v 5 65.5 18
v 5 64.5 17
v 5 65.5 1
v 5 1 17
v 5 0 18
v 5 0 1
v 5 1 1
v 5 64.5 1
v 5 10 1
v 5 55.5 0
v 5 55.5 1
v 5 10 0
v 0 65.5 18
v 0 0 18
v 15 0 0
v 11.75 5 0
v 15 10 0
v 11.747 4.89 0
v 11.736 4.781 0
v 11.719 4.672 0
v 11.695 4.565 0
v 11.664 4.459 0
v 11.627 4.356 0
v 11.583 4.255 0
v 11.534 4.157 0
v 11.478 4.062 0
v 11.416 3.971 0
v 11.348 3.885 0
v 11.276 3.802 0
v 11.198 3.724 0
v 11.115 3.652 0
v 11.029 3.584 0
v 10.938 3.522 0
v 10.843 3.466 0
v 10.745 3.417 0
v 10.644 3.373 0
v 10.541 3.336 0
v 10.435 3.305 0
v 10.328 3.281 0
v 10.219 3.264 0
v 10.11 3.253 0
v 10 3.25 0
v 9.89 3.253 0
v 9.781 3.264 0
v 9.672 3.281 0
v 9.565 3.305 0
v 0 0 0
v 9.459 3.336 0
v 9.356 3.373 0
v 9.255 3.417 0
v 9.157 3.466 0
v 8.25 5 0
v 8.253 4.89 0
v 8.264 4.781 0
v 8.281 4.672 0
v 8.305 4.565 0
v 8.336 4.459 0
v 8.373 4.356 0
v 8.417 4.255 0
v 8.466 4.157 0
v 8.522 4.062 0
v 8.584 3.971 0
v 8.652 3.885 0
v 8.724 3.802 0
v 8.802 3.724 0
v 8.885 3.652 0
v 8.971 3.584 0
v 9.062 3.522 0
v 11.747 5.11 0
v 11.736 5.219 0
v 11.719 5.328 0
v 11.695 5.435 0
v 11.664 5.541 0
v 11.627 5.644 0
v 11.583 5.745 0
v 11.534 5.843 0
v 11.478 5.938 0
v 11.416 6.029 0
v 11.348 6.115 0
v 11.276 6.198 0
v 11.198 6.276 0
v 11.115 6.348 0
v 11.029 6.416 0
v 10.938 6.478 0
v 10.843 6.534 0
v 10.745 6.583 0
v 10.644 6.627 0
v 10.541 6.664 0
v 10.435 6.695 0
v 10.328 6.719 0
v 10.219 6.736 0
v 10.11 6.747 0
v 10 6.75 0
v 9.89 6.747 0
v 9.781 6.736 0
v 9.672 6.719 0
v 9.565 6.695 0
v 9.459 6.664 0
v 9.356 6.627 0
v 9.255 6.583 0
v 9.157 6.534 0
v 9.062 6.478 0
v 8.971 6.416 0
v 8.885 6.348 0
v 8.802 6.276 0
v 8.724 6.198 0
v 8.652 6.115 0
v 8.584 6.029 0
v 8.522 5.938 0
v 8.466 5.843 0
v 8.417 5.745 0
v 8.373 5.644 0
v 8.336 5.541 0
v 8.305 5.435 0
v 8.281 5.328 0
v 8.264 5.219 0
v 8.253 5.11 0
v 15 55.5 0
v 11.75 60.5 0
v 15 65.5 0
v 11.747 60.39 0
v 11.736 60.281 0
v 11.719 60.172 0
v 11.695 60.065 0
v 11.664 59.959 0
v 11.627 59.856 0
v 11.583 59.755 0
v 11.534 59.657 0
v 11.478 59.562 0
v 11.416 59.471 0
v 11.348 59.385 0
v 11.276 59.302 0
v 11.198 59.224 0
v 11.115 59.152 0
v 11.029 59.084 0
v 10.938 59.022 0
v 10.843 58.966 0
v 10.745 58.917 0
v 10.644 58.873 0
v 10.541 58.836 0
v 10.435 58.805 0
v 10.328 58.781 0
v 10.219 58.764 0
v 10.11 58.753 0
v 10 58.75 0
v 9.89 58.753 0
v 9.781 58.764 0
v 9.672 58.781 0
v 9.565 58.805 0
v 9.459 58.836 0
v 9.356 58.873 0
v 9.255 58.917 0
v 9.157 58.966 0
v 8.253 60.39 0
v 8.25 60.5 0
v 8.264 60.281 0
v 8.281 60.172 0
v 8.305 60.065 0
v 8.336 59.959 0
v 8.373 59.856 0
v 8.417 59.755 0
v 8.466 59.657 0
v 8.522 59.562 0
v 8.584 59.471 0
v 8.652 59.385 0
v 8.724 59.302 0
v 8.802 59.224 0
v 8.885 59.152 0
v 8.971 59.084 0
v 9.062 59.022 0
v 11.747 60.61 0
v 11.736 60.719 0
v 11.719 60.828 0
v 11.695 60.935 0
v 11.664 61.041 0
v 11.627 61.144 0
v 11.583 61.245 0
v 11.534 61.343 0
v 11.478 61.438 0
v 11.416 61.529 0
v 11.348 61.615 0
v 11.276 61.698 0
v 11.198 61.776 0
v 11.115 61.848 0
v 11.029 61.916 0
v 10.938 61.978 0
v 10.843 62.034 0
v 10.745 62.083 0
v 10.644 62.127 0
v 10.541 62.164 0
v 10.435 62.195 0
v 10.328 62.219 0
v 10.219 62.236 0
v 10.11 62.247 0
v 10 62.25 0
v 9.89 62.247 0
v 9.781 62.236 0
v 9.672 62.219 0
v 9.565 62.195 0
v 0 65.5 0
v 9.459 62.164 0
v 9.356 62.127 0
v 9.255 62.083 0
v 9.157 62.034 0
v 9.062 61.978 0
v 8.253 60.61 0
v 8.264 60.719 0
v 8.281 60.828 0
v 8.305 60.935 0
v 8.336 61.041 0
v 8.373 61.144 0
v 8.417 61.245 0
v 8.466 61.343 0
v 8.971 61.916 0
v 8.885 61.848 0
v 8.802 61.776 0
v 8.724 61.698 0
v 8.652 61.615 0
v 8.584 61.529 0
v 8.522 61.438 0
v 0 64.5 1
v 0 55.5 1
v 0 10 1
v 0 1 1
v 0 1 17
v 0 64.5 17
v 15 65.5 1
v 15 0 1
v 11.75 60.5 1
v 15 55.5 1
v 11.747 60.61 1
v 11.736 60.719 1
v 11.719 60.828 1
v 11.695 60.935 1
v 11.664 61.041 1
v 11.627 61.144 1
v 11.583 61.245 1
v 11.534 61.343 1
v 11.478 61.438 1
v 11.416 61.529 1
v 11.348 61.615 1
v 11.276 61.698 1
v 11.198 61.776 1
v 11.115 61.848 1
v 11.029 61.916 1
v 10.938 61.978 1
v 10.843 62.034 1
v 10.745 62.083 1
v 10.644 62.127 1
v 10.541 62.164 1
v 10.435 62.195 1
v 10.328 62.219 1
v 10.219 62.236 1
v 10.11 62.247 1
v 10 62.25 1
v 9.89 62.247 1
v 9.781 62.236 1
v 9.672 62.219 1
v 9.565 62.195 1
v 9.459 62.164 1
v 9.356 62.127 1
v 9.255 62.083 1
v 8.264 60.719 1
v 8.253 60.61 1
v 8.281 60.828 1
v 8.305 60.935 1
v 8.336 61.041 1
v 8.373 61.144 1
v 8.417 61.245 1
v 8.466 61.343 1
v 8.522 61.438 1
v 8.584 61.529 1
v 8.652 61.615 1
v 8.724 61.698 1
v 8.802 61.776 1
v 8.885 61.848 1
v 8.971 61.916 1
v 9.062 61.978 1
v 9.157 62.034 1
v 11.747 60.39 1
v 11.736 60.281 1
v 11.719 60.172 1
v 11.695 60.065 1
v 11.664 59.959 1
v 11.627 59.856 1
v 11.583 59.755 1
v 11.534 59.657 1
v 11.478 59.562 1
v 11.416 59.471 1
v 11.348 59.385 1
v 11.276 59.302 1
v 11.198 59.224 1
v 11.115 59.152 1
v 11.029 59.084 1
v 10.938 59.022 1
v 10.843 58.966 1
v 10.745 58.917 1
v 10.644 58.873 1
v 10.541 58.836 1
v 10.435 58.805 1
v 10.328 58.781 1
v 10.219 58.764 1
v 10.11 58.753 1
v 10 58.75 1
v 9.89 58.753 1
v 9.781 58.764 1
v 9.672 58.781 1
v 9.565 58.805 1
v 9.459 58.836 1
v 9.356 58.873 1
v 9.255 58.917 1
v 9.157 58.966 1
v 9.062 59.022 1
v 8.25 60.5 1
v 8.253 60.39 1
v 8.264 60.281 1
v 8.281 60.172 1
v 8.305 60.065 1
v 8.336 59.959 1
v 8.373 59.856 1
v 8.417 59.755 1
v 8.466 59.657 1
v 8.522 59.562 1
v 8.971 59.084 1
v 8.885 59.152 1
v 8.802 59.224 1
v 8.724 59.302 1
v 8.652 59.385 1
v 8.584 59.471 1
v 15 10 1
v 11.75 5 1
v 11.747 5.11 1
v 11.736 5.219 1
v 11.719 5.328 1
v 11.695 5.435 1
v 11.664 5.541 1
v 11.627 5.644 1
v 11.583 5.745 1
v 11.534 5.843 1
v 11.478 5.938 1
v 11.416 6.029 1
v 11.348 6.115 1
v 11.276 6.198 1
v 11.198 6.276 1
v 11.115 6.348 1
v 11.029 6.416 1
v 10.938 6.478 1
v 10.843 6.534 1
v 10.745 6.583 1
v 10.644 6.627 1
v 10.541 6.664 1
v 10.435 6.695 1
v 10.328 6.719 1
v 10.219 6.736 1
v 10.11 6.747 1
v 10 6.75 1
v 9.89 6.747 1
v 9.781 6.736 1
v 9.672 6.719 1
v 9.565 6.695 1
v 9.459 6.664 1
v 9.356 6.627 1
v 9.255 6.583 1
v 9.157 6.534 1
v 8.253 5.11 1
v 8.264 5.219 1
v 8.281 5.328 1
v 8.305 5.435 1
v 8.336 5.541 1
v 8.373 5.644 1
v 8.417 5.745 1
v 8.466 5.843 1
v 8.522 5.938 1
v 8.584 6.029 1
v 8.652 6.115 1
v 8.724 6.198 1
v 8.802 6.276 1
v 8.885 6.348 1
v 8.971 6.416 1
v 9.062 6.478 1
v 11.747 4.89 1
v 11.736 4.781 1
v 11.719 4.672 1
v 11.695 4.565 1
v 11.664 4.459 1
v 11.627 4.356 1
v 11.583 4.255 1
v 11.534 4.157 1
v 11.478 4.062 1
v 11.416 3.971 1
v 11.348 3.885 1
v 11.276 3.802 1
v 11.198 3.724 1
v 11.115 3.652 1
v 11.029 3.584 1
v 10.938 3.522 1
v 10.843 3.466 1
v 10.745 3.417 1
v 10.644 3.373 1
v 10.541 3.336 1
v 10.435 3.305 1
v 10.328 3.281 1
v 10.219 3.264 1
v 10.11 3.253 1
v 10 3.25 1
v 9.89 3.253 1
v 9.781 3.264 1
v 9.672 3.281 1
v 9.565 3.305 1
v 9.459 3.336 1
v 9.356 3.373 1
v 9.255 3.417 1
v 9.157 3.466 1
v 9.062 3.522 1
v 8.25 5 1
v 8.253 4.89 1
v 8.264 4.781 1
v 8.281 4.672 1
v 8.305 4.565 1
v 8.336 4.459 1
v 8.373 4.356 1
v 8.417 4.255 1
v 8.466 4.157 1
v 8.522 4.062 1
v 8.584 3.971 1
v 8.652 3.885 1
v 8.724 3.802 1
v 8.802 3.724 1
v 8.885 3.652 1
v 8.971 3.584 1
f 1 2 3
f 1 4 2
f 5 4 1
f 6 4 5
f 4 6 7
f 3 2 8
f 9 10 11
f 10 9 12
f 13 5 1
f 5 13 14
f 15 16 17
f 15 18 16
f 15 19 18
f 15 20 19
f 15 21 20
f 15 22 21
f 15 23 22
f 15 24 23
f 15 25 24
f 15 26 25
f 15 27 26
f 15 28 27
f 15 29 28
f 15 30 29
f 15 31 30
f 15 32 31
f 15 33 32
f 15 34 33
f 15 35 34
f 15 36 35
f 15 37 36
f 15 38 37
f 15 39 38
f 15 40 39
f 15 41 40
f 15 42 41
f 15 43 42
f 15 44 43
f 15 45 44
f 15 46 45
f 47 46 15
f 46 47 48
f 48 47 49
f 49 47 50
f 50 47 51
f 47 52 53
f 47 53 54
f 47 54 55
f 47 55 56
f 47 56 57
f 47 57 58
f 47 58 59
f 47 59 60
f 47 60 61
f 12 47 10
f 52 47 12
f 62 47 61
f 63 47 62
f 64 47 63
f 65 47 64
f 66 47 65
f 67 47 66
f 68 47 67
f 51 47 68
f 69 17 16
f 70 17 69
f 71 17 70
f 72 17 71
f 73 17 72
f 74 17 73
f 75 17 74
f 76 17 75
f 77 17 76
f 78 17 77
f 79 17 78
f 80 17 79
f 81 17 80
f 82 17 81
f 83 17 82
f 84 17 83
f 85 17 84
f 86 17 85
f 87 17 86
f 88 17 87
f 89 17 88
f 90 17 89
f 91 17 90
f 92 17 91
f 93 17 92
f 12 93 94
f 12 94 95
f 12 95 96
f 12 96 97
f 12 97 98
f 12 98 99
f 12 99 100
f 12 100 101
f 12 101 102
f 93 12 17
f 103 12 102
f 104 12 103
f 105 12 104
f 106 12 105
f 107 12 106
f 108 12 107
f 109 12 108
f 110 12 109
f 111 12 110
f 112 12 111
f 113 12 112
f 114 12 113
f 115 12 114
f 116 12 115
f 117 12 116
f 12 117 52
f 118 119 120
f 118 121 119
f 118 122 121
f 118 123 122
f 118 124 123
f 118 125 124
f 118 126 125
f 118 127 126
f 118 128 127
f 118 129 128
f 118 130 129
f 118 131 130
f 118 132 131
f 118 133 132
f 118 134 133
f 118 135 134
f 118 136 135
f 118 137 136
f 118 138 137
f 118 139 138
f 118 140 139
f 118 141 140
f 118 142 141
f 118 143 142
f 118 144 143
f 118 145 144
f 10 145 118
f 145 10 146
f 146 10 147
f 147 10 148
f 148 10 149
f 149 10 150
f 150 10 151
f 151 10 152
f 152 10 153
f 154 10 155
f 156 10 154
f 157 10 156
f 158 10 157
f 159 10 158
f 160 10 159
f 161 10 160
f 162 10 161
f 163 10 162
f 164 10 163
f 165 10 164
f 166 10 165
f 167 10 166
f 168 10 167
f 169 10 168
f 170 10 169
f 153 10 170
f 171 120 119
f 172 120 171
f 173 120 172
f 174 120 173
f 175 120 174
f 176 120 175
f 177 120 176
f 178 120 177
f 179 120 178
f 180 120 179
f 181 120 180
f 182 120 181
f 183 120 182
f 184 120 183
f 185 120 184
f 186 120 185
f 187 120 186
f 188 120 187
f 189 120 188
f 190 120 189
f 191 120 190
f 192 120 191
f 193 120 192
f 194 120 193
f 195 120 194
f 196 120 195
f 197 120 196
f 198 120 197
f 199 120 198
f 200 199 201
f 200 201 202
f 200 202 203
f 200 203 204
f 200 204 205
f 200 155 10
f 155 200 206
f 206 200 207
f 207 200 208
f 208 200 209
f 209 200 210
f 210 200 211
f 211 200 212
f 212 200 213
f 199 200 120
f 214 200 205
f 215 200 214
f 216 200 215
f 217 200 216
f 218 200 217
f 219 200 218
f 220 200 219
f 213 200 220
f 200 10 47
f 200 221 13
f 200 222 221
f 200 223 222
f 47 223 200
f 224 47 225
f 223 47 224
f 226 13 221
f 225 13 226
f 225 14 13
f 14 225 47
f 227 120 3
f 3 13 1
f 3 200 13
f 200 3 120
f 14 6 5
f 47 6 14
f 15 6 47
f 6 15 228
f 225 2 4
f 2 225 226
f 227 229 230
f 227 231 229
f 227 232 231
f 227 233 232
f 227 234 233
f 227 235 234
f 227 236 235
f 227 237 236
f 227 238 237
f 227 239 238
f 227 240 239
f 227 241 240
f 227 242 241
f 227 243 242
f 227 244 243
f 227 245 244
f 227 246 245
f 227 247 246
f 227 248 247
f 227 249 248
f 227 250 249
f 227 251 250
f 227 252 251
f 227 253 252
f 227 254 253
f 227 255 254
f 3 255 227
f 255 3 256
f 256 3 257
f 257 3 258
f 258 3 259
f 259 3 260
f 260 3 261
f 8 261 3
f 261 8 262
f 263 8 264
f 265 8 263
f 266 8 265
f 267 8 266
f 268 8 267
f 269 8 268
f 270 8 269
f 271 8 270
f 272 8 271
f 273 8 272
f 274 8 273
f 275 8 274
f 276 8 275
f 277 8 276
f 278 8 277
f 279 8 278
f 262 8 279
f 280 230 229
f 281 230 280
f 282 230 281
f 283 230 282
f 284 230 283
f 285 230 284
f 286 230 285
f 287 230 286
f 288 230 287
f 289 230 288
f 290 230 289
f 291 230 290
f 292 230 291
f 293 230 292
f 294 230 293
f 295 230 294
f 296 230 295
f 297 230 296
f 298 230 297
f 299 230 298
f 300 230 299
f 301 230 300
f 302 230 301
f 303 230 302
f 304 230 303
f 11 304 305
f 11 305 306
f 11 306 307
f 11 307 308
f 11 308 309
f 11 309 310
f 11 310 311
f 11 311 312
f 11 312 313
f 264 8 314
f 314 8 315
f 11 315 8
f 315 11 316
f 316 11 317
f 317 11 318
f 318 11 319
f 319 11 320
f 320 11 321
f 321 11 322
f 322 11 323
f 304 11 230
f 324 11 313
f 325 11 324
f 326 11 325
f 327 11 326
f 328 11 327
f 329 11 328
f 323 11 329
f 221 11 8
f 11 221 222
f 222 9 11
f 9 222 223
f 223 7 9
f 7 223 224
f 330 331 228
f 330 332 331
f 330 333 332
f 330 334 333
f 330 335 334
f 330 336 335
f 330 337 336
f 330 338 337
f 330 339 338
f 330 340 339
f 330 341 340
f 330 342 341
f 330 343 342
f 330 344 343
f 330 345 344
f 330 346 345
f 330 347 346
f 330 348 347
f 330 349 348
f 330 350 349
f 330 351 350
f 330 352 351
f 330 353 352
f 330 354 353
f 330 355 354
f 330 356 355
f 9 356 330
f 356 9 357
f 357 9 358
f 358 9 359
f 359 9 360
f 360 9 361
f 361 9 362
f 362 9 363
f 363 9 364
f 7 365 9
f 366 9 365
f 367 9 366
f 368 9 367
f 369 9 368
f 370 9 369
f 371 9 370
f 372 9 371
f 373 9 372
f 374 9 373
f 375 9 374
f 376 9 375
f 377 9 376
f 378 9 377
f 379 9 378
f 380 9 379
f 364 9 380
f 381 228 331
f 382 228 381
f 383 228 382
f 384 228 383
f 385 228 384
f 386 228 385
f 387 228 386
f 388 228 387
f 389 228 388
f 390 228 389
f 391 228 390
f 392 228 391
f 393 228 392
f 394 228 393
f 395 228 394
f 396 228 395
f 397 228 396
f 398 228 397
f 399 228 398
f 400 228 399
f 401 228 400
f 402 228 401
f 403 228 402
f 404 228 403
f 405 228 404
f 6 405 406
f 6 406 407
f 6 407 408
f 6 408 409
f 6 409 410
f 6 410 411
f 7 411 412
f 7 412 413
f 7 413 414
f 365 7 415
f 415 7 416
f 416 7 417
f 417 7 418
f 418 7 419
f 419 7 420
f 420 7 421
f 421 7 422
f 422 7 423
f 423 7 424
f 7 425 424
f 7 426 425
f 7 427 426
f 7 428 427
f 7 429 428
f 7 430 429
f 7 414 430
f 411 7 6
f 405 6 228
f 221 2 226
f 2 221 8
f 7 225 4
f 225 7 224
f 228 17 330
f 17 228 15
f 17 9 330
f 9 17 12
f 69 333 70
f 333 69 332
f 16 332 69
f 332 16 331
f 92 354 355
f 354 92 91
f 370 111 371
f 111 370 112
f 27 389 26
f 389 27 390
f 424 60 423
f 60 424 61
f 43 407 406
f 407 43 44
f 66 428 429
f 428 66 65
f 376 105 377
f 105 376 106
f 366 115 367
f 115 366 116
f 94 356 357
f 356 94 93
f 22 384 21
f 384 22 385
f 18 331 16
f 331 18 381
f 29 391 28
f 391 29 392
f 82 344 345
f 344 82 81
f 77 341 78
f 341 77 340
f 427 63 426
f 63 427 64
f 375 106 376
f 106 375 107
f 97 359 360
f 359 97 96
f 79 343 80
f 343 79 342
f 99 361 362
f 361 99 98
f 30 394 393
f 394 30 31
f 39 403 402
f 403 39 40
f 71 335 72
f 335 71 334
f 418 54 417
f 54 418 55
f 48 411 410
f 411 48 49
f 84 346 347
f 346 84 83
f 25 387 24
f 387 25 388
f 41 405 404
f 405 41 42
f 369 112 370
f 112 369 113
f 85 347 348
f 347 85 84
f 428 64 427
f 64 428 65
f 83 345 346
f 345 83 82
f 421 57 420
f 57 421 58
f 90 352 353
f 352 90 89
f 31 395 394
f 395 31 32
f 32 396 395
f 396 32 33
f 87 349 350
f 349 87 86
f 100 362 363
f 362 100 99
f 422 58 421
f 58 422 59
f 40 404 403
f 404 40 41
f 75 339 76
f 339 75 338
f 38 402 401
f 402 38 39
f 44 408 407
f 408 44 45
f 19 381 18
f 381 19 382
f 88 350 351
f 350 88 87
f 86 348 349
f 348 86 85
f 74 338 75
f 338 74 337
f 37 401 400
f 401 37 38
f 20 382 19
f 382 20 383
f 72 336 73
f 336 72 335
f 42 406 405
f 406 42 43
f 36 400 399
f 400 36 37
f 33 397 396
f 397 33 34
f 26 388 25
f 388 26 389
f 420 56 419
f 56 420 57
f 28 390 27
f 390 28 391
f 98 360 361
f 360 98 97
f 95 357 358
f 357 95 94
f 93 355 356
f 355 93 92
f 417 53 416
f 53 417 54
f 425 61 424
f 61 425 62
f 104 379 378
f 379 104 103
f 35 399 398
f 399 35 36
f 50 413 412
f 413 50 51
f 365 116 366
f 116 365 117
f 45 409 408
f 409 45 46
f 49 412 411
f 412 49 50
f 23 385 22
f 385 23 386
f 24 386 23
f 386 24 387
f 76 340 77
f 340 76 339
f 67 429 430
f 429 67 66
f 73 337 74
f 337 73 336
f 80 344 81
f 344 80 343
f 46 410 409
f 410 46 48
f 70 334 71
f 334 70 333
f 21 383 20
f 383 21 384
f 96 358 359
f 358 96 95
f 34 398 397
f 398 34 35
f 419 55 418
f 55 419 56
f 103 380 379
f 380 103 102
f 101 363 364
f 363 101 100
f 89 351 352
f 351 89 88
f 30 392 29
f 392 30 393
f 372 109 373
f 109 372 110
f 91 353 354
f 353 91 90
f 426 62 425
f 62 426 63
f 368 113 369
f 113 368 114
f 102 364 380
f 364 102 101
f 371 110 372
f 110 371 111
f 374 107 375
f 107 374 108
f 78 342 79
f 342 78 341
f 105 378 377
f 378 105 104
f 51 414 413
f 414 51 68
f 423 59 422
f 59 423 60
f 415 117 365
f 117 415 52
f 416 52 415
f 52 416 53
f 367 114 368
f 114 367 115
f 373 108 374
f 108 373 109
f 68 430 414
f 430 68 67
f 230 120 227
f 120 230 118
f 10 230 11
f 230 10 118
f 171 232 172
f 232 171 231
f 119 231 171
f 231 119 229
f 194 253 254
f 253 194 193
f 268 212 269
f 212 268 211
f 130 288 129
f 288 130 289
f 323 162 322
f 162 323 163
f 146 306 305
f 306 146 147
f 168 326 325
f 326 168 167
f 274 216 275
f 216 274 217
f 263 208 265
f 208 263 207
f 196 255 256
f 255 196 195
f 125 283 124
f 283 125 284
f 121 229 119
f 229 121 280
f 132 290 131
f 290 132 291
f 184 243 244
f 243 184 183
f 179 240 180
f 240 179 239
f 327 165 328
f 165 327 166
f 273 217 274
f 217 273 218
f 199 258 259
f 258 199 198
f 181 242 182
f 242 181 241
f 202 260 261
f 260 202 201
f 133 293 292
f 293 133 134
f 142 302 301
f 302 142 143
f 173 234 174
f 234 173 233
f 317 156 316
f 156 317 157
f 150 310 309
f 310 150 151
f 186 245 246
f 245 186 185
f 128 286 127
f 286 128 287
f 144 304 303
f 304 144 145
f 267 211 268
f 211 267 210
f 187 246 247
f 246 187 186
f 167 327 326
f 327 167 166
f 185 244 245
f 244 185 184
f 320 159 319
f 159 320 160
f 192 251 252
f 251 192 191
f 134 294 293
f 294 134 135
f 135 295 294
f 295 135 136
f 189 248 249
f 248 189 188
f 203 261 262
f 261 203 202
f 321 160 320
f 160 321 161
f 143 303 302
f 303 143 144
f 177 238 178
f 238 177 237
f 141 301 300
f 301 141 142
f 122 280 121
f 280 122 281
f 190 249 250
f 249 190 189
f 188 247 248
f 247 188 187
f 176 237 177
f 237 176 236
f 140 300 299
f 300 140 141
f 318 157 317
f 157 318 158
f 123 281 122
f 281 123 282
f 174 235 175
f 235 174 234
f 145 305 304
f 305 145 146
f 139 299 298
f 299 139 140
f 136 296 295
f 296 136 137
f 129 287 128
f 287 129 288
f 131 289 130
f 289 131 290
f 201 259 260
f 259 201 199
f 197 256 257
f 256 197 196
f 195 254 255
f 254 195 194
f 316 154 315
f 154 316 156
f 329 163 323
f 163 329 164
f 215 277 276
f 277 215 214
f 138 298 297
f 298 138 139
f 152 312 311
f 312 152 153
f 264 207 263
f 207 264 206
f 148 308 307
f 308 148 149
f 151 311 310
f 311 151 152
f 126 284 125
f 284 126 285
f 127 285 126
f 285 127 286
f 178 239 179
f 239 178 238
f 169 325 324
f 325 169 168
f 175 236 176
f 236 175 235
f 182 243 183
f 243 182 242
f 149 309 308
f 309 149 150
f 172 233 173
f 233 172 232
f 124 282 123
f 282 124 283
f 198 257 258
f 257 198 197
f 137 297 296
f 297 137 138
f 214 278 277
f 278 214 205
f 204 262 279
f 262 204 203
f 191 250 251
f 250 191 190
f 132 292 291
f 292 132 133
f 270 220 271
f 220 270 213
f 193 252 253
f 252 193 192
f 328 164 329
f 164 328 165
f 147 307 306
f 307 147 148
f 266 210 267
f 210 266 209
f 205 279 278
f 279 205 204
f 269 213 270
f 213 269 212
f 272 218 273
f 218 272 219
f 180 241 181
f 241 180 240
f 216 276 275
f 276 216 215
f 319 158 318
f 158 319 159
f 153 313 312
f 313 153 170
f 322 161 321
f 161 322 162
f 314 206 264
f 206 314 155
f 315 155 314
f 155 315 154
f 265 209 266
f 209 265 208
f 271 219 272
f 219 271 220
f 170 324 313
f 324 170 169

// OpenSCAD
difference(){
cube([5,65.5,18]);
  translate([0,1,1])
    cube([5,63.5,16,]);
}


difference(){
  cube([15,10,1]);
  translate([10,5,0])
  cylinder(d=3.5, $fn=100);
}
translate([0,65.5-10,0])
difference(){
  cube([15,10,1]);
  translate([10,5,0])
  cylinder(d=3.5, $fn=100);
}
